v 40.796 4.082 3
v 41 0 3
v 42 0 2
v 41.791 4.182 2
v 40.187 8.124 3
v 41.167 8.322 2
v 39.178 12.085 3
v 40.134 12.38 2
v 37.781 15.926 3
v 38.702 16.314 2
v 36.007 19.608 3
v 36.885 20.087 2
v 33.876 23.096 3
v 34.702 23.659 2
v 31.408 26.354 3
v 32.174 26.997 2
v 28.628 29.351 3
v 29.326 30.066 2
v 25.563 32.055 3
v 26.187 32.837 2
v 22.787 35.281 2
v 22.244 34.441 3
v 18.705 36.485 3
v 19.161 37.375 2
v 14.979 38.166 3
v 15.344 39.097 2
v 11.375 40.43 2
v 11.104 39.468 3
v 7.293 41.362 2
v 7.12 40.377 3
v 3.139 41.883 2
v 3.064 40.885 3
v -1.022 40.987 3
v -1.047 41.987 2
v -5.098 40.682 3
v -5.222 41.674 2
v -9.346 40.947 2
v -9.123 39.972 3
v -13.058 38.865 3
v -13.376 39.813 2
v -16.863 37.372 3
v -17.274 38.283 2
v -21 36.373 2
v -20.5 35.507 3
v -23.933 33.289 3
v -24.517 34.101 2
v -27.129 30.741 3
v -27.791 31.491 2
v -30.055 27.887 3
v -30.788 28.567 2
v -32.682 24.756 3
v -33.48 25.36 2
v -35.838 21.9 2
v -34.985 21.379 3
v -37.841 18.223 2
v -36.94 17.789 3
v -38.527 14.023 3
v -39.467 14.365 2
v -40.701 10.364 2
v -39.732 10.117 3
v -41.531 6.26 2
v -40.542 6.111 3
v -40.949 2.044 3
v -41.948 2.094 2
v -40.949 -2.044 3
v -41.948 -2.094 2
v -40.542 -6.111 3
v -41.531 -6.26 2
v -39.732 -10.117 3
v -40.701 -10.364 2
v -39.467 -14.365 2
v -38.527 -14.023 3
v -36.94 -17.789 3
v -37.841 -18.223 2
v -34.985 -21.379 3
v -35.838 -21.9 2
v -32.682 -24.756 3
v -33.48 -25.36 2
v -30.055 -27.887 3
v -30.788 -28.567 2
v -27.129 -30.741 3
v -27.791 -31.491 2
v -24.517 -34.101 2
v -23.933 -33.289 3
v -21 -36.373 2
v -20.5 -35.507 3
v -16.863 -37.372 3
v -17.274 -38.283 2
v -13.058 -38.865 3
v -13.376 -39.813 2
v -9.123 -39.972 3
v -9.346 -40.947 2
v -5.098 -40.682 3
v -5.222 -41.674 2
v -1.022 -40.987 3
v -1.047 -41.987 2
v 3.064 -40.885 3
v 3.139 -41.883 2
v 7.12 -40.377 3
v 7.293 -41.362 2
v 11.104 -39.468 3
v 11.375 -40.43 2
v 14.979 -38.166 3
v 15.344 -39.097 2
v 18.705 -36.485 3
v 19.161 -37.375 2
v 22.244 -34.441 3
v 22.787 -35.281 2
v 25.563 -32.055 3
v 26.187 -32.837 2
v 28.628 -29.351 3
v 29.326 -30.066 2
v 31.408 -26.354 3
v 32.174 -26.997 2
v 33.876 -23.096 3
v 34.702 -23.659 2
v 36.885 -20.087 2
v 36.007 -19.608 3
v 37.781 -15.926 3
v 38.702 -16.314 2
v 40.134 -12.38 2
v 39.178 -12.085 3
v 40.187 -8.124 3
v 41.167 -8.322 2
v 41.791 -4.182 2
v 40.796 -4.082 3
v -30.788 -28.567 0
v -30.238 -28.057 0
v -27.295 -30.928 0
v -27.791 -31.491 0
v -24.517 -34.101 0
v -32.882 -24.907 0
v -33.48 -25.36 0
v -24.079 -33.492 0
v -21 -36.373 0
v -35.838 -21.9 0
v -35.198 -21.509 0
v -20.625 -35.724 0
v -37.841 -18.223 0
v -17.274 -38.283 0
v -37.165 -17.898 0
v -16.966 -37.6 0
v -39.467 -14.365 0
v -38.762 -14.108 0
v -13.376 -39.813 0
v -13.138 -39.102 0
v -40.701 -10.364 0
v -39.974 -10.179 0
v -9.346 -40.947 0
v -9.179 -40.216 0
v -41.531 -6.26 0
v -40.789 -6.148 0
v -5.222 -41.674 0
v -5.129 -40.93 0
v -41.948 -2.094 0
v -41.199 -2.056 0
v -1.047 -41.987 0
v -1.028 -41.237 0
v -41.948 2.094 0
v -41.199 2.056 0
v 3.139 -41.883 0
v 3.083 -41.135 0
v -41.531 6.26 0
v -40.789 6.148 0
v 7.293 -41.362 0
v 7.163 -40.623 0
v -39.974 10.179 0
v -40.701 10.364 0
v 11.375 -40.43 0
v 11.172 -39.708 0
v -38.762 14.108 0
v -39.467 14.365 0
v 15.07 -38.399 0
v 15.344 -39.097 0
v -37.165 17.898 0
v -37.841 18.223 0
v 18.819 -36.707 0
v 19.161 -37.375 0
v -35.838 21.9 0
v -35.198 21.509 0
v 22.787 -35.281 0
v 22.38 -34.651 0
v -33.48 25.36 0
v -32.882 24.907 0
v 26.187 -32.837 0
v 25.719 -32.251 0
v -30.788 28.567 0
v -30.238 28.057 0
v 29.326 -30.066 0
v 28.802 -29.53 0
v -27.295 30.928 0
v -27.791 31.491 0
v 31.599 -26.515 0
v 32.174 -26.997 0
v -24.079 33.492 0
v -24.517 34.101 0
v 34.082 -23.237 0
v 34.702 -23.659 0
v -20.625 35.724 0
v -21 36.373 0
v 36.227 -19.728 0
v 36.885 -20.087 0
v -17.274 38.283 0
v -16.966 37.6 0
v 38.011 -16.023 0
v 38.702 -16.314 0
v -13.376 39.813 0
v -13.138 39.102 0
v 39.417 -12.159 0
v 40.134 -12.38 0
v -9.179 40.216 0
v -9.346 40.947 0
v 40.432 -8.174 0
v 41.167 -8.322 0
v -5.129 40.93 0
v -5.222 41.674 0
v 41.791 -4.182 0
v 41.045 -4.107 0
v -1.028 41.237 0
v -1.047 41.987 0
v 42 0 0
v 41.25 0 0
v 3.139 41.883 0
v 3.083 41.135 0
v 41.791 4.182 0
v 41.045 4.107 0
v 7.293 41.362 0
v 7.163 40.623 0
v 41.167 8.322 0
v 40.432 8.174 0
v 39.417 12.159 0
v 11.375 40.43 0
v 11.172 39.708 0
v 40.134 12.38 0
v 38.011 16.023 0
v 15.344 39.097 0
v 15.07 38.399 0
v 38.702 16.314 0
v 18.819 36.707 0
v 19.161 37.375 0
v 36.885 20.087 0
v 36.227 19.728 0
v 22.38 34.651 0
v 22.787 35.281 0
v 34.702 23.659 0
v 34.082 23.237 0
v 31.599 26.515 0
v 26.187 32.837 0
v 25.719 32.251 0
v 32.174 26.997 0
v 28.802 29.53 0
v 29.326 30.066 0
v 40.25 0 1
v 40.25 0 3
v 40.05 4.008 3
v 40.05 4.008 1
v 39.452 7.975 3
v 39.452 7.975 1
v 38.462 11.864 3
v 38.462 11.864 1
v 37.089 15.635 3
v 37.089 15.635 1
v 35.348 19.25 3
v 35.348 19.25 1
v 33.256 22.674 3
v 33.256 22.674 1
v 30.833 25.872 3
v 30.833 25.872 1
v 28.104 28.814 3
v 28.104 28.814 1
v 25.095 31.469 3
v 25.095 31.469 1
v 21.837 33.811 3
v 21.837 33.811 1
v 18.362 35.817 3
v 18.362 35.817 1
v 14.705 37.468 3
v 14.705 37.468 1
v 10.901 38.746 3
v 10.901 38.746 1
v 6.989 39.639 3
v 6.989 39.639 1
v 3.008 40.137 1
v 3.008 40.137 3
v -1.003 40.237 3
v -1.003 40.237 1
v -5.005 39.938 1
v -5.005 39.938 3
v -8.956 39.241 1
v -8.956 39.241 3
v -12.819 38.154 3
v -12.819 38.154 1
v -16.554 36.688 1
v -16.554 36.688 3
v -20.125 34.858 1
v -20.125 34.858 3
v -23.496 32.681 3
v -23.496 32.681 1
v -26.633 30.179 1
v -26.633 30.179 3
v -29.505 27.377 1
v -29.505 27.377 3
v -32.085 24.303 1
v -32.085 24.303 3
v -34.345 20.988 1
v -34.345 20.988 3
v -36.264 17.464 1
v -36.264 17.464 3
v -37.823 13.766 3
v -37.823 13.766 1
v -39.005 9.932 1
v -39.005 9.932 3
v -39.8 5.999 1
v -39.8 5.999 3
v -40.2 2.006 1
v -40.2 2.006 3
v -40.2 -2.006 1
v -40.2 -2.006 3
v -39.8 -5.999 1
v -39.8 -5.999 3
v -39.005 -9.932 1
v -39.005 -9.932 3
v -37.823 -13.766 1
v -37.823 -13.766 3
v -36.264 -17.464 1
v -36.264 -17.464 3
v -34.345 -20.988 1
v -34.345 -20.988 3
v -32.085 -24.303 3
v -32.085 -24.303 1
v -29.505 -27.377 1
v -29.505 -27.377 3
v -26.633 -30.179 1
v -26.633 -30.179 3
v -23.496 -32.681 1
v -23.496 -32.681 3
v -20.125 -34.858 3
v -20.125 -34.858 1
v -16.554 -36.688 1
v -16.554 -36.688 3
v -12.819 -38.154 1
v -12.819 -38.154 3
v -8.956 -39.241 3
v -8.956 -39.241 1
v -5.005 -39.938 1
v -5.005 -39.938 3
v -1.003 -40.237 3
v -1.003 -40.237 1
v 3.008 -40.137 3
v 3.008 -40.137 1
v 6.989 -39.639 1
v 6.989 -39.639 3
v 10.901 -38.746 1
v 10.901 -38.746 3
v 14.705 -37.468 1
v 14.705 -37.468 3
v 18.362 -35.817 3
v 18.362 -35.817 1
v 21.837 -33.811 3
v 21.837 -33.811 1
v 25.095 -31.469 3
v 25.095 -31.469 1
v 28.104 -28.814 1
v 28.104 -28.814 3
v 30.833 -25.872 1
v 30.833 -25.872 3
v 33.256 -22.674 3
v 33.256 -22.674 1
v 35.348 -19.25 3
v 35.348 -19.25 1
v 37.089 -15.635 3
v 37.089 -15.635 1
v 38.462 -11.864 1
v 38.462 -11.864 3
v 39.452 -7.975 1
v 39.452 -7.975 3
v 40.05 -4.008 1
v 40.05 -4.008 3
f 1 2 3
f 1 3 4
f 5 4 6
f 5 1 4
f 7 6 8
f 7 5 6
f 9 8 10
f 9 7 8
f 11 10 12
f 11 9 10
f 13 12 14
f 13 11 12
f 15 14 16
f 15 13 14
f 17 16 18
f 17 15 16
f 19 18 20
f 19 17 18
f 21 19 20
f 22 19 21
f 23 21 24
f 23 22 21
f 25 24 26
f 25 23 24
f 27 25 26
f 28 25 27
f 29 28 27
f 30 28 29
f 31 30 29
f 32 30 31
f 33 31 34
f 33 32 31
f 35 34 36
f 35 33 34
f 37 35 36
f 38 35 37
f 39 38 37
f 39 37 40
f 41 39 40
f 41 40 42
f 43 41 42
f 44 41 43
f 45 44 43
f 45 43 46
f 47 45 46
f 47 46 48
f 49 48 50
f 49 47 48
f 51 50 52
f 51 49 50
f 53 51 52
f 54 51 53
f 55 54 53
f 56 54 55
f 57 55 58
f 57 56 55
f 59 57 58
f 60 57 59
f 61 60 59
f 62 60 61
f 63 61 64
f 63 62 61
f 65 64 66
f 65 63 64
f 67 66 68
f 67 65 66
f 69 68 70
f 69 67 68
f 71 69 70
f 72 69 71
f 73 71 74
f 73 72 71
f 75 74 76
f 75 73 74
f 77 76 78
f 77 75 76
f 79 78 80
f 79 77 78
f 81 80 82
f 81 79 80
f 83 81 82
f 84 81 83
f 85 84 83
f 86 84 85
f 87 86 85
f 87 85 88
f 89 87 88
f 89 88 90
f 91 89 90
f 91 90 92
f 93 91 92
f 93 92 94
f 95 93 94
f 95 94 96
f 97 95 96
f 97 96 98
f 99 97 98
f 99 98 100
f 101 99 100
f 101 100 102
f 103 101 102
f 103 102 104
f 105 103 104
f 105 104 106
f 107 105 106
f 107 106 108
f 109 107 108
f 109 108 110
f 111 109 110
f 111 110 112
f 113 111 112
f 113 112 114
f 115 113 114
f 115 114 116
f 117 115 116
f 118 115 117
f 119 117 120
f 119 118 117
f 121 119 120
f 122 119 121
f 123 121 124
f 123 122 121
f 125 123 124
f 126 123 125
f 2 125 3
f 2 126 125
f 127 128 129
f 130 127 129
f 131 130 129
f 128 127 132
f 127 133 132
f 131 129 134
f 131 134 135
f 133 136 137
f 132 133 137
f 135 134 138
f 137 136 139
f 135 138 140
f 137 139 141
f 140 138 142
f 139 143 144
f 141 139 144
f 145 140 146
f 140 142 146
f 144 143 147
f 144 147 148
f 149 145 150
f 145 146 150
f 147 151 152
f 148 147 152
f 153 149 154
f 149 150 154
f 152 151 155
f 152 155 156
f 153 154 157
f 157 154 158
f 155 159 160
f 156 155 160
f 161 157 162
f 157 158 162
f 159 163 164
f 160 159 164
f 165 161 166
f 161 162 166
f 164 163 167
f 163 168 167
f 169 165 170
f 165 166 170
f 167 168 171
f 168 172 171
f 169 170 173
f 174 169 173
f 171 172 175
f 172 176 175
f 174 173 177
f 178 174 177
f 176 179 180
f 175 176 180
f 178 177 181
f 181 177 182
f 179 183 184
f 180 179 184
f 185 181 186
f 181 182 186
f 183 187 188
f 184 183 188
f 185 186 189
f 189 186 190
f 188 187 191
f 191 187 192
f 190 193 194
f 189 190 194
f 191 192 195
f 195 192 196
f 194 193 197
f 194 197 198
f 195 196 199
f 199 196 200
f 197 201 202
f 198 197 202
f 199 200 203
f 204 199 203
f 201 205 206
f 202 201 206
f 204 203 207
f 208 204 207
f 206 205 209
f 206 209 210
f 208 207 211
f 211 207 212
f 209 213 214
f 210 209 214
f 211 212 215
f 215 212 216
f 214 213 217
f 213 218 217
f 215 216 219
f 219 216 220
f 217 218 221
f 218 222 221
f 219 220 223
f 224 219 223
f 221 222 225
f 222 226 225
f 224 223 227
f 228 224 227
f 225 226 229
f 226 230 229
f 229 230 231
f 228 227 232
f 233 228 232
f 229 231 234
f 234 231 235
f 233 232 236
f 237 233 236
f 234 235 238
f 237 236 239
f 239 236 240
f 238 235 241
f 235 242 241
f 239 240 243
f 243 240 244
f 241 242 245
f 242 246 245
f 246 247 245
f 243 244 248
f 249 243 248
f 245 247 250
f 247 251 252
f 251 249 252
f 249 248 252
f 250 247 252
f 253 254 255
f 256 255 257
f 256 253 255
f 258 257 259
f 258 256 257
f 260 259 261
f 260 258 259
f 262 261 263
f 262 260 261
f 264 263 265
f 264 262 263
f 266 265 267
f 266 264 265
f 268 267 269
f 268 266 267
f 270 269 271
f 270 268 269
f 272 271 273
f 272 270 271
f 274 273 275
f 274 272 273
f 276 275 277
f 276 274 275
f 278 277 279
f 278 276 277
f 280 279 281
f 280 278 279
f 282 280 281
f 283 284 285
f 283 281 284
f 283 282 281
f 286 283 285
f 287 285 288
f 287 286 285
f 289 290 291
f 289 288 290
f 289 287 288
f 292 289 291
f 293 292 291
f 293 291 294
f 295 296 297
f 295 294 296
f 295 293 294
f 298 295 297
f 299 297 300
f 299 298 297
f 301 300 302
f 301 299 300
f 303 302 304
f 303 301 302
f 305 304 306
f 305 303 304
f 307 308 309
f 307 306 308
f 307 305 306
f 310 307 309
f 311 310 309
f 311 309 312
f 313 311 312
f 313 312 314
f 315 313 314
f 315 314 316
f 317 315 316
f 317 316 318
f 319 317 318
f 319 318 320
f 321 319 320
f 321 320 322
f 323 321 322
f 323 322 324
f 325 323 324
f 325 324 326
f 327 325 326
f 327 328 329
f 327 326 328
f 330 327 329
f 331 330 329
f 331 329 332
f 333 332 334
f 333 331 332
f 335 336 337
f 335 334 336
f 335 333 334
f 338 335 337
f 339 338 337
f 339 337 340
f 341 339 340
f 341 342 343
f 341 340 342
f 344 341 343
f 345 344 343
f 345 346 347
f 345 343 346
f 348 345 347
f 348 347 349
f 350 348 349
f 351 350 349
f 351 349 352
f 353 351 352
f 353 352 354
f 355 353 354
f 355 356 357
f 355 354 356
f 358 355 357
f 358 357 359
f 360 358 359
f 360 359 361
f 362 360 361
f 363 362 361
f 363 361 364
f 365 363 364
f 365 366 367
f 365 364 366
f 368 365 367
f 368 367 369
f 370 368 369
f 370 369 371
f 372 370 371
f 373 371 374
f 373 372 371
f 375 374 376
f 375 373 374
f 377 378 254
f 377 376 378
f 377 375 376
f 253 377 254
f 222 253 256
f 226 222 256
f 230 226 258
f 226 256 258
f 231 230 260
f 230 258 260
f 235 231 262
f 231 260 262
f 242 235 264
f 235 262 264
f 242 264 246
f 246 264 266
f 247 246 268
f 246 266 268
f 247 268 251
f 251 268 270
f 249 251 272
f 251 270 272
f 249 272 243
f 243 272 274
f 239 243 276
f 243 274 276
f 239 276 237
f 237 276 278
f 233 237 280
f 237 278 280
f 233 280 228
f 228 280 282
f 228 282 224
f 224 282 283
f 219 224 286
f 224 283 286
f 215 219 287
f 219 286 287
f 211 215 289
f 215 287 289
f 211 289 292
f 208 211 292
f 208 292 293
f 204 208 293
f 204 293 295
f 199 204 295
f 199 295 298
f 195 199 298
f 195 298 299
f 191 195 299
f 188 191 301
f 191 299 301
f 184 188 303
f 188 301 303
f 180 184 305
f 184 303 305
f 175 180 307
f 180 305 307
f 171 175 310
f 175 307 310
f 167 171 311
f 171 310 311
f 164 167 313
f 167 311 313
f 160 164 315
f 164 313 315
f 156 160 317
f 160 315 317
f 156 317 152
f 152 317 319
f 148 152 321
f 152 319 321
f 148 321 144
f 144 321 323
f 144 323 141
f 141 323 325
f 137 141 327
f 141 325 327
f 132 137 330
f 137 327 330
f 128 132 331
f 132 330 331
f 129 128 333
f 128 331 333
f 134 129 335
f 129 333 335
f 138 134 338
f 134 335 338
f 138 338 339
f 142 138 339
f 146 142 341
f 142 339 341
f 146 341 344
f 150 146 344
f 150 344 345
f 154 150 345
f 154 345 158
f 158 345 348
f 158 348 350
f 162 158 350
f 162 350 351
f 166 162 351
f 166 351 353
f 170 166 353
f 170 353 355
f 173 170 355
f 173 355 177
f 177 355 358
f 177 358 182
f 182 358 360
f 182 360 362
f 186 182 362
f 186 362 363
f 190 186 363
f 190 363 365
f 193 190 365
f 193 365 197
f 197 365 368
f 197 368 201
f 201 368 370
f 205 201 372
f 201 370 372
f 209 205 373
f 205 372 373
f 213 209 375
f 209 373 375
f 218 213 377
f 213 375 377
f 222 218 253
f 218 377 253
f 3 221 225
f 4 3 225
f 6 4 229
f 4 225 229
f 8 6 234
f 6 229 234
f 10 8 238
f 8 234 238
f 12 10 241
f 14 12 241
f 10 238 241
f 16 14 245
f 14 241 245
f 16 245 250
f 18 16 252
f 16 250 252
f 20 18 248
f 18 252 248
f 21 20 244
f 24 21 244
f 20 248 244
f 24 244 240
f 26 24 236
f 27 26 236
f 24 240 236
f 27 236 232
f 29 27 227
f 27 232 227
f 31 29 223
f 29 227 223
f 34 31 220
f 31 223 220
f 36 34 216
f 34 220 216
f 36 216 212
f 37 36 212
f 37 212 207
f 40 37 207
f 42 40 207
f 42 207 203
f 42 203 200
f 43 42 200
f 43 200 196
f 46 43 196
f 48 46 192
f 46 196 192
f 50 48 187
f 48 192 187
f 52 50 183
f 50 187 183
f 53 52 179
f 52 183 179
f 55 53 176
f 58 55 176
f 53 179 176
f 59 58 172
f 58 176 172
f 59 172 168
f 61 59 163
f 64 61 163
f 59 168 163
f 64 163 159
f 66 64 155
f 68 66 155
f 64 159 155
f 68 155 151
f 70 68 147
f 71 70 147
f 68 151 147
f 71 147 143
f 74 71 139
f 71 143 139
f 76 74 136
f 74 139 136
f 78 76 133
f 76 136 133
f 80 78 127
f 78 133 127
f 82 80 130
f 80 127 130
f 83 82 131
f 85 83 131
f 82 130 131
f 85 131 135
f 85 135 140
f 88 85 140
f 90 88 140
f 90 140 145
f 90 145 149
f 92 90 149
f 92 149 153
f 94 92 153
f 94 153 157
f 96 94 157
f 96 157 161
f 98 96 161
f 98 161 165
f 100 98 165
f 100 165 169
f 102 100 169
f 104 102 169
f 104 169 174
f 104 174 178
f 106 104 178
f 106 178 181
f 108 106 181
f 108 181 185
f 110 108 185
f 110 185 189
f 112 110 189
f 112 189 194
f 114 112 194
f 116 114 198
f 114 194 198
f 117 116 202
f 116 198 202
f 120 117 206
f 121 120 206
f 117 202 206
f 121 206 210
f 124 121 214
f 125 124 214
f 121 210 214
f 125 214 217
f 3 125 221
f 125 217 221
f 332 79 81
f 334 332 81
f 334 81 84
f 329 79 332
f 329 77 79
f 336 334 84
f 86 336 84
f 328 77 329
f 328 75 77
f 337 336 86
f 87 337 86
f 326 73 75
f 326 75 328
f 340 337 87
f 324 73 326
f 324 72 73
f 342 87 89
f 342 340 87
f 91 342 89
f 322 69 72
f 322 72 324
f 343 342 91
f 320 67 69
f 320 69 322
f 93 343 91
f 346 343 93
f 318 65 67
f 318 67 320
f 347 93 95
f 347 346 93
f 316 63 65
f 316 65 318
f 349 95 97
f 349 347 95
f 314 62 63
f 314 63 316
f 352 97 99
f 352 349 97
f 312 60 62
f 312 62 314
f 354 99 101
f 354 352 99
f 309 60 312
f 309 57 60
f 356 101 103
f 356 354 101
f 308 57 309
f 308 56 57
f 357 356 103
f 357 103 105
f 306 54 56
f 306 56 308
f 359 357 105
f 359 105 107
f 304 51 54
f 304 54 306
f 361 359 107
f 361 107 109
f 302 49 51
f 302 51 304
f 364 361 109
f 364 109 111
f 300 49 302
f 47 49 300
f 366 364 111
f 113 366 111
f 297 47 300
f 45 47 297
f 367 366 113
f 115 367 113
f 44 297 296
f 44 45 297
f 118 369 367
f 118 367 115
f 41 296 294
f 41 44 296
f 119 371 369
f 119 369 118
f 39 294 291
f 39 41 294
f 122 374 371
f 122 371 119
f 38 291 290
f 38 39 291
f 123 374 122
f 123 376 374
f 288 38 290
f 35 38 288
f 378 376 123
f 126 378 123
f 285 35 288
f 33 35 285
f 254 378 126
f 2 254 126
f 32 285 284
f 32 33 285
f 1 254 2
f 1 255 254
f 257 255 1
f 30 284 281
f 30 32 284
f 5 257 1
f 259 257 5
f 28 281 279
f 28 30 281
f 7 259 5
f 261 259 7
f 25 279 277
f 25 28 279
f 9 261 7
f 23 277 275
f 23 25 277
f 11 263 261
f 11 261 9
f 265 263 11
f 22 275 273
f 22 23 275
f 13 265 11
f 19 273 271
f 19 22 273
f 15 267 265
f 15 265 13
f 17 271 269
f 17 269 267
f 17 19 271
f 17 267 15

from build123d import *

# Parameters (mm, degrees)
F0_R     = 42
F2_DEPTH = 3
F1_R     = 40.25
F3_DEPTH = 16
F4_SIZE  = 1
F5_W     = 7
F5_H     = 3
F6_DEPTH = 50


with BuildPart() as f2:
    # F0 (on Top) → F2 (new body)
    with BuildSketch(Plane.XY):
        Circle(F0_R)
    extrude(amount=F2_DEPTH)

    # F1 (on Top) → F3 (cut)
    with BuildSketch(Plane.XY):
        Circle(F1_R)
    extrude(amount=F3_DEPTH, mode=Mode.SUBTRACT)

    # F4
    f4_edges = [f2.edges().sort_by_distance(p)[0] for p in [
        (-40.25, 0, 0),
        (-42, 0, 3),
    ]]
    chamfer(f4_edges, length=F4_SIZE)

    # F5 (on Front) → F6 (cut)
    with BuildSketch(Plane.XZ):
        with Locations((-3.5, 13.5)):
            Rectangle(F5_W, F5_H)
    extrude(amount=-F6_DEPTH, mode=Mode.SUBTRACT)


solid = f2.part
